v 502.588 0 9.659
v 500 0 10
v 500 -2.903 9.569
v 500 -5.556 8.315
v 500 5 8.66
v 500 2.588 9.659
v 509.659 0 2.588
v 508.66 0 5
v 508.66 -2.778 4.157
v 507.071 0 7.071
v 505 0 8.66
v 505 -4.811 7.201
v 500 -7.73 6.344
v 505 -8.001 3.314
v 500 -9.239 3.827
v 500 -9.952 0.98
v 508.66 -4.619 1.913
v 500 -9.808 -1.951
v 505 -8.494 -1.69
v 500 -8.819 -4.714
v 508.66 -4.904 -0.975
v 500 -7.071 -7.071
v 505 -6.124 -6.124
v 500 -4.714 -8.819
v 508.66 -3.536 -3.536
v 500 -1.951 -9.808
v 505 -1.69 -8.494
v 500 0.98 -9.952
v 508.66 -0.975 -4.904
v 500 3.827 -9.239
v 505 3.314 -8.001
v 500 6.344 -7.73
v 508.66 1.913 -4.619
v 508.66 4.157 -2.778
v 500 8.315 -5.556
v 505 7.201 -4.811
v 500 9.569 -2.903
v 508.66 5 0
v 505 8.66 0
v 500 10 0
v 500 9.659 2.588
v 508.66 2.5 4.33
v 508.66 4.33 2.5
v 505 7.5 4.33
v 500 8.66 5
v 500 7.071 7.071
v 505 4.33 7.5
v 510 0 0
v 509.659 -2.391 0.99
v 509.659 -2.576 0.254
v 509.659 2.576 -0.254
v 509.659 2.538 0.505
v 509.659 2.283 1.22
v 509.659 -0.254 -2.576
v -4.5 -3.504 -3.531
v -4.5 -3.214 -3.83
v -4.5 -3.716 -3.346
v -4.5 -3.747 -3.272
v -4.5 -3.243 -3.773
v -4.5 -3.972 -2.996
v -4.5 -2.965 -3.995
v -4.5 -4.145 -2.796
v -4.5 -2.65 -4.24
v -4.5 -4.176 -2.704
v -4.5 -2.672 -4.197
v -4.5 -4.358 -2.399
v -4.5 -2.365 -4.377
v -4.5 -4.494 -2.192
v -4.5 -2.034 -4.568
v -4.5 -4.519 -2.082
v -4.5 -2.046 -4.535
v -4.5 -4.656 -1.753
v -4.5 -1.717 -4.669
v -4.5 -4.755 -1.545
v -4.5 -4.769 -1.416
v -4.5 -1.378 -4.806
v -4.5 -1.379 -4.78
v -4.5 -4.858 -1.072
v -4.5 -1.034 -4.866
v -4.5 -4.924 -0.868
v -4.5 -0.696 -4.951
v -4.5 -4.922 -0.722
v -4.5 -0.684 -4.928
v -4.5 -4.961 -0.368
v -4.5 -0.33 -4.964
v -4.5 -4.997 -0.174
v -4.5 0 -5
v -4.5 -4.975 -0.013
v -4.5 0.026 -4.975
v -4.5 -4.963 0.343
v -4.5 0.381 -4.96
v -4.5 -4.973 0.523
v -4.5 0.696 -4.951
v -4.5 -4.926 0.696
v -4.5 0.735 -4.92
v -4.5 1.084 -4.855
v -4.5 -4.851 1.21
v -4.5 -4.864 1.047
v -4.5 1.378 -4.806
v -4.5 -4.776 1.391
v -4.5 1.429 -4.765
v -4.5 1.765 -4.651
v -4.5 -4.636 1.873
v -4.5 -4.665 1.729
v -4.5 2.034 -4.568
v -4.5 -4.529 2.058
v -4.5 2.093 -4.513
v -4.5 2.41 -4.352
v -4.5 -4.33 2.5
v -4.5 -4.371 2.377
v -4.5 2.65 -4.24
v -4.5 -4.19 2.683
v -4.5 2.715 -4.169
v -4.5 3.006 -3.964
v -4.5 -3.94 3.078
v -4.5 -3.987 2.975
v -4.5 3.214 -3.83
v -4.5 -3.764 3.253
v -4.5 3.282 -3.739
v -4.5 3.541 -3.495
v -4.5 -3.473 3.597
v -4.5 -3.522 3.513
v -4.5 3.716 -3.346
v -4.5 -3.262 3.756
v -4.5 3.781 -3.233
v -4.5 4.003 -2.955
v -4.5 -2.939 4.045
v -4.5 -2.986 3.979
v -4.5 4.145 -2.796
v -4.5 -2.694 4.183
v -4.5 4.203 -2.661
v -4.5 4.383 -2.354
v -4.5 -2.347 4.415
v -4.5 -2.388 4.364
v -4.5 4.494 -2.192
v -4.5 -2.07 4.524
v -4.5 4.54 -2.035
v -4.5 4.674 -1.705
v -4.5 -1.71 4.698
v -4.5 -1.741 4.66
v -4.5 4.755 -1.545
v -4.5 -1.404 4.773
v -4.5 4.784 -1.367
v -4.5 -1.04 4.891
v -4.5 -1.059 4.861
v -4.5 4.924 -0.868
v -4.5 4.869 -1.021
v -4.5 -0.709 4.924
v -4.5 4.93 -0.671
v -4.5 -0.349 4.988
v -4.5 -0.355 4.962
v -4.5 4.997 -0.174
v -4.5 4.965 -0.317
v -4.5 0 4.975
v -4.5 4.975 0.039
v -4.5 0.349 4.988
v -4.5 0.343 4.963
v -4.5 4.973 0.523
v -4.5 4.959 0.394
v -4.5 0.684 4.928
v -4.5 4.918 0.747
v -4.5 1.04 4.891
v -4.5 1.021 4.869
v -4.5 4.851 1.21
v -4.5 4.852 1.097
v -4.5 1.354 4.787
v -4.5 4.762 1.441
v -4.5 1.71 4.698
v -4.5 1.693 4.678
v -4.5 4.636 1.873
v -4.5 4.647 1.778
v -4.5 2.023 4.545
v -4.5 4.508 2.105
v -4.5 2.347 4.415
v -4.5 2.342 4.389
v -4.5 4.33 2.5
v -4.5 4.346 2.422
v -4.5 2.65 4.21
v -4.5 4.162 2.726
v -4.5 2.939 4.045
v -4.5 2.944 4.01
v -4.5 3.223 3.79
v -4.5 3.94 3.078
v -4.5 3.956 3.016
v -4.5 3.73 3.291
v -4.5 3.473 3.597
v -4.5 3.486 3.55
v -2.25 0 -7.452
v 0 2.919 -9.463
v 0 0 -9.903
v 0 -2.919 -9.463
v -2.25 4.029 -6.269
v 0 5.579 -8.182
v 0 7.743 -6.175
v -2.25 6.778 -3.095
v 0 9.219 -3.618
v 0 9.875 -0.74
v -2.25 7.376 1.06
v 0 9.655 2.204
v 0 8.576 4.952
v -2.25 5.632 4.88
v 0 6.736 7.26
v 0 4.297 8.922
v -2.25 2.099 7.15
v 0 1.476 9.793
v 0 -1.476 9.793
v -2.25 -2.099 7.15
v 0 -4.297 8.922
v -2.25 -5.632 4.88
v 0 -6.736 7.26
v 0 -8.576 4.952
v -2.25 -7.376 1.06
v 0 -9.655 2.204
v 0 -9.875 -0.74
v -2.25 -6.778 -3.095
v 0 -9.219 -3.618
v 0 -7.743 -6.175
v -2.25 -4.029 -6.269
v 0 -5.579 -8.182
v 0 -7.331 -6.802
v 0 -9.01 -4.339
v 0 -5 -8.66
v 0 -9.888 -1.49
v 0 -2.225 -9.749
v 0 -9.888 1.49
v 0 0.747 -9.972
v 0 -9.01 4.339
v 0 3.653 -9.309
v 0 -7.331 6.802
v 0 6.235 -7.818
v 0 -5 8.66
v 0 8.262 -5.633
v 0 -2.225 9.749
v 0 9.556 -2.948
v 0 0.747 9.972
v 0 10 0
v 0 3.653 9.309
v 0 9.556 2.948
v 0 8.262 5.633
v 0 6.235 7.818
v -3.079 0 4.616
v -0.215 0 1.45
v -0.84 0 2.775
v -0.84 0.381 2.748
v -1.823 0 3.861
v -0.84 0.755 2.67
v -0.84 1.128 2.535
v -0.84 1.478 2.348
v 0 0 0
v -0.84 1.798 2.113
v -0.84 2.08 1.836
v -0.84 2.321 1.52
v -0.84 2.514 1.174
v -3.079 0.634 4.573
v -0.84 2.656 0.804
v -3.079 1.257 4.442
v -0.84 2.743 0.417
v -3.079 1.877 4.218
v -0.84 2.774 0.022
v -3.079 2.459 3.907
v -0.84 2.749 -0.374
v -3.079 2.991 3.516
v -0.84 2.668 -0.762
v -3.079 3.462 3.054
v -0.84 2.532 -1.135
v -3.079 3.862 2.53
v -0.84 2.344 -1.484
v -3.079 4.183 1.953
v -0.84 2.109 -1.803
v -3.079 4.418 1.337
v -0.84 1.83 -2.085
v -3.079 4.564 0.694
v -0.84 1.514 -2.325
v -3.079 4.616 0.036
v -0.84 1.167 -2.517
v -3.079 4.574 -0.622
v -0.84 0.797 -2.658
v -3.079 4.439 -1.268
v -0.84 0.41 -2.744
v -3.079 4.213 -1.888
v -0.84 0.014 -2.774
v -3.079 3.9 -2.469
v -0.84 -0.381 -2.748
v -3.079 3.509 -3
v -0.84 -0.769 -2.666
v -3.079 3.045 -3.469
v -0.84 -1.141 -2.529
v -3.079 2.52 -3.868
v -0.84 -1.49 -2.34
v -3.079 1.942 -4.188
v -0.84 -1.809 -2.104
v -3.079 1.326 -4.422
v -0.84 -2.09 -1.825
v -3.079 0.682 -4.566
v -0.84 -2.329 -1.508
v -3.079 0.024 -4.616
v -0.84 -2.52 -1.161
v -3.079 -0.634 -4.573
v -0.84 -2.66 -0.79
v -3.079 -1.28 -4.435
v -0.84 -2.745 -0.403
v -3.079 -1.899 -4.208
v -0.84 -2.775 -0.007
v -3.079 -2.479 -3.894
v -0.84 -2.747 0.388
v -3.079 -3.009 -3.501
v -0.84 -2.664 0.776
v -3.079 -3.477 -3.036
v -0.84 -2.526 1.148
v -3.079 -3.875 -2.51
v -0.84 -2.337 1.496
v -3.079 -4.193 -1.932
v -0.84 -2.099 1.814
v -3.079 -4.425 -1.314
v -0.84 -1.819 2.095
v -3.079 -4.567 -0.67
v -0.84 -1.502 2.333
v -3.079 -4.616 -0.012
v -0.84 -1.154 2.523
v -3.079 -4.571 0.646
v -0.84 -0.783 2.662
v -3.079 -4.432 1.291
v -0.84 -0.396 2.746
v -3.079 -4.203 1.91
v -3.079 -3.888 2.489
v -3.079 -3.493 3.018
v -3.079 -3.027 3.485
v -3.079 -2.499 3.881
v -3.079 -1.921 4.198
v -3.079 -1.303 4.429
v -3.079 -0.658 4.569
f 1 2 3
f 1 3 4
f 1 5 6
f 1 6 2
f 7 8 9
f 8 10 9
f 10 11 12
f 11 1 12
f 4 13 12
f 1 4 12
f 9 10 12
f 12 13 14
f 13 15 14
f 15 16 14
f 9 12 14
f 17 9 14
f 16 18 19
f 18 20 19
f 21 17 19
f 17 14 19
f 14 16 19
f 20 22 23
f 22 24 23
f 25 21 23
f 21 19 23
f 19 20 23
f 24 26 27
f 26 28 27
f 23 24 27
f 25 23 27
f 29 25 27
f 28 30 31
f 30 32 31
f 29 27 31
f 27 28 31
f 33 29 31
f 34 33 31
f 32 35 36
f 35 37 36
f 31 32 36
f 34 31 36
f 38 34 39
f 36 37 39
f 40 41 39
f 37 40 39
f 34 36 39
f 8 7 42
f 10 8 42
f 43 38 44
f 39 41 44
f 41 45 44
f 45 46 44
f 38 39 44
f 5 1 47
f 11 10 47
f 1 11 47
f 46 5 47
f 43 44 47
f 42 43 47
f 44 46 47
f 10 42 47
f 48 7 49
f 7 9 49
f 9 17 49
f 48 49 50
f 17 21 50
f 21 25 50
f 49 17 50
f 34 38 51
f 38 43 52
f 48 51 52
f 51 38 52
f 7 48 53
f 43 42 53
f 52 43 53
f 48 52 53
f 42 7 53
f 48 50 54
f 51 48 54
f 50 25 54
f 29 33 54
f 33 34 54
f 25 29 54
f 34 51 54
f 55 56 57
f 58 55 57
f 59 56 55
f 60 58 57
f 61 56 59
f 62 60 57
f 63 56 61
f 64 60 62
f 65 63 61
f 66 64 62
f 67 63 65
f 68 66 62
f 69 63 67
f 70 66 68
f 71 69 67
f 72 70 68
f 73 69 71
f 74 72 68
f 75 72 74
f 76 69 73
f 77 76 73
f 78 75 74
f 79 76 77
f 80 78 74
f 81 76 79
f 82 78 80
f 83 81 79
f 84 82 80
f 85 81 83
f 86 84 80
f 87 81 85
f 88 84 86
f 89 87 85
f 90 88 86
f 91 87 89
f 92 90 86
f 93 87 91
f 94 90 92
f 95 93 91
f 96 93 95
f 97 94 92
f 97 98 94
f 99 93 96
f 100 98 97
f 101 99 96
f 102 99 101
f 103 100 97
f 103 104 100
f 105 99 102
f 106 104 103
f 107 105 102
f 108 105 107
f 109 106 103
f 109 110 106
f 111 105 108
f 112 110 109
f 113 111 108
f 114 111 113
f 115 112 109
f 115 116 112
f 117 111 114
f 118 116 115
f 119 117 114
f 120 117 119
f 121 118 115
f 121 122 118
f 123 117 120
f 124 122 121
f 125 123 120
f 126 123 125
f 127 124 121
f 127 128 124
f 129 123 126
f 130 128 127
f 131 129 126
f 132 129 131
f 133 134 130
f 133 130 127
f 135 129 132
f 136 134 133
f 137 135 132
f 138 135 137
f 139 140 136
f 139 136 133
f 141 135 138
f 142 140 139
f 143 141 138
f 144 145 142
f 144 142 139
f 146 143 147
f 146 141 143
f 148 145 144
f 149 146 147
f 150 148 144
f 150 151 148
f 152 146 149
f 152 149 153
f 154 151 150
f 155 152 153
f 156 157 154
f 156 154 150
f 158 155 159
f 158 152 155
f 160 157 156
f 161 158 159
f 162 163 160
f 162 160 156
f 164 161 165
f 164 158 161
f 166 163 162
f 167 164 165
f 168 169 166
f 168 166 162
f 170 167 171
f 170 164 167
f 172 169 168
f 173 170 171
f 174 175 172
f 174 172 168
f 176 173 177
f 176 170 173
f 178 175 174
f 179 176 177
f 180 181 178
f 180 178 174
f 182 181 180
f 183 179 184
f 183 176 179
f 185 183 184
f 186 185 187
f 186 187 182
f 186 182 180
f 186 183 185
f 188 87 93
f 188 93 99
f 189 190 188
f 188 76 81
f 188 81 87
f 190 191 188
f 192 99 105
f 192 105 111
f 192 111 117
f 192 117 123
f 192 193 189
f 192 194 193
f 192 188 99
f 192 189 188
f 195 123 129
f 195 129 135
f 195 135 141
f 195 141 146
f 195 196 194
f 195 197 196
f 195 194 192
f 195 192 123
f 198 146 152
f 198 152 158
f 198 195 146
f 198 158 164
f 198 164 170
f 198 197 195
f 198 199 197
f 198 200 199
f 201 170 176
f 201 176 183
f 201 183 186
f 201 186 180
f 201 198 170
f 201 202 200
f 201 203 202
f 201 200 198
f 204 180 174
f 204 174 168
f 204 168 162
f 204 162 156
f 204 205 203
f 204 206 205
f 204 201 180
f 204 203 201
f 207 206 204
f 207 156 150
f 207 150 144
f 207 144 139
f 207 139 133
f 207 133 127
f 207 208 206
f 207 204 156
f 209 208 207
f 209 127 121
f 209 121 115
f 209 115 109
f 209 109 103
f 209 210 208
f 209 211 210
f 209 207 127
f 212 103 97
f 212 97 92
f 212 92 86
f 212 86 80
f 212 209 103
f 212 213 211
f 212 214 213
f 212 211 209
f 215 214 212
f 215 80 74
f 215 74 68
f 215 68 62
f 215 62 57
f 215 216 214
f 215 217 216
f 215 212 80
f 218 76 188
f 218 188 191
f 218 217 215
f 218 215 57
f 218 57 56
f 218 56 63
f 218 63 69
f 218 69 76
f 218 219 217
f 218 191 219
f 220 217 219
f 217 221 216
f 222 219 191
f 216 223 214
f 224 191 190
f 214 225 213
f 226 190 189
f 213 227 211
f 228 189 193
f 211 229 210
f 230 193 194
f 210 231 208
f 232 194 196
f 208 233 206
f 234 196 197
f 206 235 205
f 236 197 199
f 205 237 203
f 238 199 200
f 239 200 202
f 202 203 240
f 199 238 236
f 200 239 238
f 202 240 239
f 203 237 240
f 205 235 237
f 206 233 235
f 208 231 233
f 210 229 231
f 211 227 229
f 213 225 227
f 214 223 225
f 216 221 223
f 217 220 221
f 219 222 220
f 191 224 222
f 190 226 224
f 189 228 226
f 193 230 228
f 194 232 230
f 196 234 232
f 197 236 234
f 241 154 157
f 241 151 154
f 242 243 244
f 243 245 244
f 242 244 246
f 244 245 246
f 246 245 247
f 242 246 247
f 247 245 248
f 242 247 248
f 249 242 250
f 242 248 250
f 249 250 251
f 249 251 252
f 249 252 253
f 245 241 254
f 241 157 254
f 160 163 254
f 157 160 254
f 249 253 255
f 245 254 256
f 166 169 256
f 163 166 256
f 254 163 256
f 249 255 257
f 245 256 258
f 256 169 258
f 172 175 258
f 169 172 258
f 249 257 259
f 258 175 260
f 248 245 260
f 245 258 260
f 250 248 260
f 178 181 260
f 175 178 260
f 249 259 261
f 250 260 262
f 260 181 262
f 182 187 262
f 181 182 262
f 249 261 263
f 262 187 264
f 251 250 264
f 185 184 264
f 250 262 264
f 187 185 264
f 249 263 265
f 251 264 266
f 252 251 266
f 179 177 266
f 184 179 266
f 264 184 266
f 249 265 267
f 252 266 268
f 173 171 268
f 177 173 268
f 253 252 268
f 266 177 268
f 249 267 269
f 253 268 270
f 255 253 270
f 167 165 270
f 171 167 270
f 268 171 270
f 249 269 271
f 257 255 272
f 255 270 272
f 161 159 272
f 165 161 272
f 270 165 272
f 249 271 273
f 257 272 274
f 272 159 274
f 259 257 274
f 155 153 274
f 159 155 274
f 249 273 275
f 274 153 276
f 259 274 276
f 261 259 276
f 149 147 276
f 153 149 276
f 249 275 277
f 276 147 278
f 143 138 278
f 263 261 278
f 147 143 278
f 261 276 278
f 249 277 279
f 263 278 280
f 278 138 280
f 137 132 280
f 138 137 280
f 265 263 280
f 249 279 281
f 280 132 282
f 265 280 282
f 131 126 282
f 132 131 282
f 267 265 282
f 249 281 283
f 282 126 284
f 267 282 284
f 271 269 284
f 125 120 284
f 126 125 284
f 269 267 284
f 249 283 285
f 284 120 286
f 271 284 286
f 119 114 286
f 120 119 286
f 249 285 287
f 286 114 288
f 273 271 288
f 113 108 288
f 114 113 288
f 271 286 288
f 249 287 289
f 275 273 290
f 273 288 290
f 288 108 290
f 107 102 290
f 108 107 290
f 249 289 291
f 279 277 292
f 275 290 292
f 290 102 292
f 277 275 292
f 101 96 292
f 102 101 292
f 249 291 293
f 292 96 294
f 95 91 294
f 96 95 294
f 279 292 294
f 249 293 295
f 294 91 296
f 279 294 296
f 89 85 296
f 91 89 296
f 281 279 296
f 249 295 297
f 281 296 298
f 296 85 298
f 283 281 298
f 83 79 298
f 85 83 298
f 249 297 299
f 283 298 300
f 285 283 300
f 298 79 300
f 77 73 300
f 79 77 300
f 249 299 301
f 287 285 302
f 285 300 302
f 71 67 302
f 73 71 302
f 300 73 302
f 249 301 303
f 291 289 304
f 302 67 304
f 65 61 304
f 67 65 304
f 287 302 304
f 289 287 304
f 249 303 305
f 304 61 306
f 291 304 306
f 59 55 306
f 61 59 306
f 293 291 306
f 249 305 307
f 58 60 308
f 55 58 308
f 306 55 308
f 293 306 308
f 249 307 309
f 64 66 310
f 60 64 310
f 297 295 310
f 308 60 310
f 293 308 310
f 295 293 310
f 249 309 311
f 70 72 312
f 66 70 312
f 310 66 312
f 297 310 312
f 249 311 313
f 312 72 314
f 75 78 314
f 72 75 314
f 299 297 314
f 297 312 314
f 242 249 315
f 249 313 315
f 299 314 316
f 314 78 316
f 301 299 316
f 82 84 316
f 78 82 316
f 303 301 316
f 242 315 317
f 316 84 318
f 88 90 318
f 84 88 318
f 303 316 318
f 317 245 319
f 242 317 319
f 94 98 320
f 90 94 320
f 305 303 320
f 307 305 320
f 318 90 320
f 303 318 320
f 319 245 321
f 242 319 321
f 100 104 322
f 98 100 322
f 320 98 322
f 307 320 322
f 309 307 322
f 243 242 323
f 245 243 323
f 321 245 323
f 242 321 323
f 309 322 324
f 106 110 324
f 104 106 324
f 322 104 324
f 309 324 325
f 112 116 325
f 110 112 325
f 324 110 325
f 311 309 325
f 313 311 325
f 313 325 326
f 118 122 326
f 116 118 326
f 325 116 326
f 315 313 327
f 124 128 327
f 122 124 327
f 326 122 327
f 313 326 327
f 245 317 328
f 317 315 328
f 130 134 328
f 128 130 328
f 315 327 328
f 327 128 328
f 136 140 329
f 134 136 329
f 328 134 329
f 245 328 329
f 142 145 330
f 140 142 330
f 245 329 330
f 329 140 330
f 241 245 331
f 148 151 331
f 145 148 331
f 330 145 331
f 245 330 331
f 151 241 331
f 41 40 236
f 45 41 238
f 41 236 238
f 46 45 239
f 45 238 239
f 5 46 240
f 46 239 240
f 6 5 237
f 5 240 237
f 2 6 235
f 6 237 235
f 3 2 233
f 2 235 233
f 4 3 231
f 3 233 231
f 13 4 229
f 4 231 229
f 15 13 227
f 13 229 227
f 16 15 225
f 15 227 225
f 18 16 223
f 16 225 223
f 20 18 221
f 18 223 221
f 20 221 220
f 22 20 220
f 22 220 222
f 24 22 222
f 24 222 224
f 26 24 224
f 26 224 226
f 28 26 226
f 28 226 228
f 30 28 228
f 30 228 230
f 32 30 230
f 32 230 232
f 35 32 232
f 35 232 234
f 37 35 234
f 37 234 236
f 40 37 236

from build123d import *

# Parameters (mm, degrees)
F0_R     = 10
F1_DEPTH = 500


with BuildPart() as f1:
    # F0 (on Right) → F1 (new body)
    with BuildSketch(Plane.YZ):
        Circle(F0_R)
    extrude(amount=F1_DEPTH)

    # F2 (on Front) → F3 (revolve)
    with BuildSketch(Plane.XZ):
        Polygon((-4.5, -5), (0, -9.90314), (0, 0), (-4.5, 0), align=None)
    revolve(axis=Axis((-2.25, 0, 0), (1, 0, 0)))

    # F4 (on Front) → F5 (revolve, cut)
    with BuildSketch(Plane.XZ):
        with BuildLine():
            Line((-5, 0), (0, 0))
            ThreePointArc((0, 0), (-1.464466, 3.535534), (-5, 5))
            Line((-5, 5), (-5, 0))
        make_face()
    revolve(axis=Axis((-7.712245, 0, 0), (-1, 0, 0)), mode=Mode.SUBTRACT)

    # F6 (on Front) → F7 (revolve)
    with BuildSketch(Plane.XZ):
        with BuildLine():
            Line((500, 0), (510, 0))
            ThreePointArc((510, 0), (507.071068, 7.071068), (500, 10))
            Line((500, 10), (500, 0))
        make_face()
    revolve(axis=Axis((505, 0, 0), (1, 0, 0)))


solid = f1.part
